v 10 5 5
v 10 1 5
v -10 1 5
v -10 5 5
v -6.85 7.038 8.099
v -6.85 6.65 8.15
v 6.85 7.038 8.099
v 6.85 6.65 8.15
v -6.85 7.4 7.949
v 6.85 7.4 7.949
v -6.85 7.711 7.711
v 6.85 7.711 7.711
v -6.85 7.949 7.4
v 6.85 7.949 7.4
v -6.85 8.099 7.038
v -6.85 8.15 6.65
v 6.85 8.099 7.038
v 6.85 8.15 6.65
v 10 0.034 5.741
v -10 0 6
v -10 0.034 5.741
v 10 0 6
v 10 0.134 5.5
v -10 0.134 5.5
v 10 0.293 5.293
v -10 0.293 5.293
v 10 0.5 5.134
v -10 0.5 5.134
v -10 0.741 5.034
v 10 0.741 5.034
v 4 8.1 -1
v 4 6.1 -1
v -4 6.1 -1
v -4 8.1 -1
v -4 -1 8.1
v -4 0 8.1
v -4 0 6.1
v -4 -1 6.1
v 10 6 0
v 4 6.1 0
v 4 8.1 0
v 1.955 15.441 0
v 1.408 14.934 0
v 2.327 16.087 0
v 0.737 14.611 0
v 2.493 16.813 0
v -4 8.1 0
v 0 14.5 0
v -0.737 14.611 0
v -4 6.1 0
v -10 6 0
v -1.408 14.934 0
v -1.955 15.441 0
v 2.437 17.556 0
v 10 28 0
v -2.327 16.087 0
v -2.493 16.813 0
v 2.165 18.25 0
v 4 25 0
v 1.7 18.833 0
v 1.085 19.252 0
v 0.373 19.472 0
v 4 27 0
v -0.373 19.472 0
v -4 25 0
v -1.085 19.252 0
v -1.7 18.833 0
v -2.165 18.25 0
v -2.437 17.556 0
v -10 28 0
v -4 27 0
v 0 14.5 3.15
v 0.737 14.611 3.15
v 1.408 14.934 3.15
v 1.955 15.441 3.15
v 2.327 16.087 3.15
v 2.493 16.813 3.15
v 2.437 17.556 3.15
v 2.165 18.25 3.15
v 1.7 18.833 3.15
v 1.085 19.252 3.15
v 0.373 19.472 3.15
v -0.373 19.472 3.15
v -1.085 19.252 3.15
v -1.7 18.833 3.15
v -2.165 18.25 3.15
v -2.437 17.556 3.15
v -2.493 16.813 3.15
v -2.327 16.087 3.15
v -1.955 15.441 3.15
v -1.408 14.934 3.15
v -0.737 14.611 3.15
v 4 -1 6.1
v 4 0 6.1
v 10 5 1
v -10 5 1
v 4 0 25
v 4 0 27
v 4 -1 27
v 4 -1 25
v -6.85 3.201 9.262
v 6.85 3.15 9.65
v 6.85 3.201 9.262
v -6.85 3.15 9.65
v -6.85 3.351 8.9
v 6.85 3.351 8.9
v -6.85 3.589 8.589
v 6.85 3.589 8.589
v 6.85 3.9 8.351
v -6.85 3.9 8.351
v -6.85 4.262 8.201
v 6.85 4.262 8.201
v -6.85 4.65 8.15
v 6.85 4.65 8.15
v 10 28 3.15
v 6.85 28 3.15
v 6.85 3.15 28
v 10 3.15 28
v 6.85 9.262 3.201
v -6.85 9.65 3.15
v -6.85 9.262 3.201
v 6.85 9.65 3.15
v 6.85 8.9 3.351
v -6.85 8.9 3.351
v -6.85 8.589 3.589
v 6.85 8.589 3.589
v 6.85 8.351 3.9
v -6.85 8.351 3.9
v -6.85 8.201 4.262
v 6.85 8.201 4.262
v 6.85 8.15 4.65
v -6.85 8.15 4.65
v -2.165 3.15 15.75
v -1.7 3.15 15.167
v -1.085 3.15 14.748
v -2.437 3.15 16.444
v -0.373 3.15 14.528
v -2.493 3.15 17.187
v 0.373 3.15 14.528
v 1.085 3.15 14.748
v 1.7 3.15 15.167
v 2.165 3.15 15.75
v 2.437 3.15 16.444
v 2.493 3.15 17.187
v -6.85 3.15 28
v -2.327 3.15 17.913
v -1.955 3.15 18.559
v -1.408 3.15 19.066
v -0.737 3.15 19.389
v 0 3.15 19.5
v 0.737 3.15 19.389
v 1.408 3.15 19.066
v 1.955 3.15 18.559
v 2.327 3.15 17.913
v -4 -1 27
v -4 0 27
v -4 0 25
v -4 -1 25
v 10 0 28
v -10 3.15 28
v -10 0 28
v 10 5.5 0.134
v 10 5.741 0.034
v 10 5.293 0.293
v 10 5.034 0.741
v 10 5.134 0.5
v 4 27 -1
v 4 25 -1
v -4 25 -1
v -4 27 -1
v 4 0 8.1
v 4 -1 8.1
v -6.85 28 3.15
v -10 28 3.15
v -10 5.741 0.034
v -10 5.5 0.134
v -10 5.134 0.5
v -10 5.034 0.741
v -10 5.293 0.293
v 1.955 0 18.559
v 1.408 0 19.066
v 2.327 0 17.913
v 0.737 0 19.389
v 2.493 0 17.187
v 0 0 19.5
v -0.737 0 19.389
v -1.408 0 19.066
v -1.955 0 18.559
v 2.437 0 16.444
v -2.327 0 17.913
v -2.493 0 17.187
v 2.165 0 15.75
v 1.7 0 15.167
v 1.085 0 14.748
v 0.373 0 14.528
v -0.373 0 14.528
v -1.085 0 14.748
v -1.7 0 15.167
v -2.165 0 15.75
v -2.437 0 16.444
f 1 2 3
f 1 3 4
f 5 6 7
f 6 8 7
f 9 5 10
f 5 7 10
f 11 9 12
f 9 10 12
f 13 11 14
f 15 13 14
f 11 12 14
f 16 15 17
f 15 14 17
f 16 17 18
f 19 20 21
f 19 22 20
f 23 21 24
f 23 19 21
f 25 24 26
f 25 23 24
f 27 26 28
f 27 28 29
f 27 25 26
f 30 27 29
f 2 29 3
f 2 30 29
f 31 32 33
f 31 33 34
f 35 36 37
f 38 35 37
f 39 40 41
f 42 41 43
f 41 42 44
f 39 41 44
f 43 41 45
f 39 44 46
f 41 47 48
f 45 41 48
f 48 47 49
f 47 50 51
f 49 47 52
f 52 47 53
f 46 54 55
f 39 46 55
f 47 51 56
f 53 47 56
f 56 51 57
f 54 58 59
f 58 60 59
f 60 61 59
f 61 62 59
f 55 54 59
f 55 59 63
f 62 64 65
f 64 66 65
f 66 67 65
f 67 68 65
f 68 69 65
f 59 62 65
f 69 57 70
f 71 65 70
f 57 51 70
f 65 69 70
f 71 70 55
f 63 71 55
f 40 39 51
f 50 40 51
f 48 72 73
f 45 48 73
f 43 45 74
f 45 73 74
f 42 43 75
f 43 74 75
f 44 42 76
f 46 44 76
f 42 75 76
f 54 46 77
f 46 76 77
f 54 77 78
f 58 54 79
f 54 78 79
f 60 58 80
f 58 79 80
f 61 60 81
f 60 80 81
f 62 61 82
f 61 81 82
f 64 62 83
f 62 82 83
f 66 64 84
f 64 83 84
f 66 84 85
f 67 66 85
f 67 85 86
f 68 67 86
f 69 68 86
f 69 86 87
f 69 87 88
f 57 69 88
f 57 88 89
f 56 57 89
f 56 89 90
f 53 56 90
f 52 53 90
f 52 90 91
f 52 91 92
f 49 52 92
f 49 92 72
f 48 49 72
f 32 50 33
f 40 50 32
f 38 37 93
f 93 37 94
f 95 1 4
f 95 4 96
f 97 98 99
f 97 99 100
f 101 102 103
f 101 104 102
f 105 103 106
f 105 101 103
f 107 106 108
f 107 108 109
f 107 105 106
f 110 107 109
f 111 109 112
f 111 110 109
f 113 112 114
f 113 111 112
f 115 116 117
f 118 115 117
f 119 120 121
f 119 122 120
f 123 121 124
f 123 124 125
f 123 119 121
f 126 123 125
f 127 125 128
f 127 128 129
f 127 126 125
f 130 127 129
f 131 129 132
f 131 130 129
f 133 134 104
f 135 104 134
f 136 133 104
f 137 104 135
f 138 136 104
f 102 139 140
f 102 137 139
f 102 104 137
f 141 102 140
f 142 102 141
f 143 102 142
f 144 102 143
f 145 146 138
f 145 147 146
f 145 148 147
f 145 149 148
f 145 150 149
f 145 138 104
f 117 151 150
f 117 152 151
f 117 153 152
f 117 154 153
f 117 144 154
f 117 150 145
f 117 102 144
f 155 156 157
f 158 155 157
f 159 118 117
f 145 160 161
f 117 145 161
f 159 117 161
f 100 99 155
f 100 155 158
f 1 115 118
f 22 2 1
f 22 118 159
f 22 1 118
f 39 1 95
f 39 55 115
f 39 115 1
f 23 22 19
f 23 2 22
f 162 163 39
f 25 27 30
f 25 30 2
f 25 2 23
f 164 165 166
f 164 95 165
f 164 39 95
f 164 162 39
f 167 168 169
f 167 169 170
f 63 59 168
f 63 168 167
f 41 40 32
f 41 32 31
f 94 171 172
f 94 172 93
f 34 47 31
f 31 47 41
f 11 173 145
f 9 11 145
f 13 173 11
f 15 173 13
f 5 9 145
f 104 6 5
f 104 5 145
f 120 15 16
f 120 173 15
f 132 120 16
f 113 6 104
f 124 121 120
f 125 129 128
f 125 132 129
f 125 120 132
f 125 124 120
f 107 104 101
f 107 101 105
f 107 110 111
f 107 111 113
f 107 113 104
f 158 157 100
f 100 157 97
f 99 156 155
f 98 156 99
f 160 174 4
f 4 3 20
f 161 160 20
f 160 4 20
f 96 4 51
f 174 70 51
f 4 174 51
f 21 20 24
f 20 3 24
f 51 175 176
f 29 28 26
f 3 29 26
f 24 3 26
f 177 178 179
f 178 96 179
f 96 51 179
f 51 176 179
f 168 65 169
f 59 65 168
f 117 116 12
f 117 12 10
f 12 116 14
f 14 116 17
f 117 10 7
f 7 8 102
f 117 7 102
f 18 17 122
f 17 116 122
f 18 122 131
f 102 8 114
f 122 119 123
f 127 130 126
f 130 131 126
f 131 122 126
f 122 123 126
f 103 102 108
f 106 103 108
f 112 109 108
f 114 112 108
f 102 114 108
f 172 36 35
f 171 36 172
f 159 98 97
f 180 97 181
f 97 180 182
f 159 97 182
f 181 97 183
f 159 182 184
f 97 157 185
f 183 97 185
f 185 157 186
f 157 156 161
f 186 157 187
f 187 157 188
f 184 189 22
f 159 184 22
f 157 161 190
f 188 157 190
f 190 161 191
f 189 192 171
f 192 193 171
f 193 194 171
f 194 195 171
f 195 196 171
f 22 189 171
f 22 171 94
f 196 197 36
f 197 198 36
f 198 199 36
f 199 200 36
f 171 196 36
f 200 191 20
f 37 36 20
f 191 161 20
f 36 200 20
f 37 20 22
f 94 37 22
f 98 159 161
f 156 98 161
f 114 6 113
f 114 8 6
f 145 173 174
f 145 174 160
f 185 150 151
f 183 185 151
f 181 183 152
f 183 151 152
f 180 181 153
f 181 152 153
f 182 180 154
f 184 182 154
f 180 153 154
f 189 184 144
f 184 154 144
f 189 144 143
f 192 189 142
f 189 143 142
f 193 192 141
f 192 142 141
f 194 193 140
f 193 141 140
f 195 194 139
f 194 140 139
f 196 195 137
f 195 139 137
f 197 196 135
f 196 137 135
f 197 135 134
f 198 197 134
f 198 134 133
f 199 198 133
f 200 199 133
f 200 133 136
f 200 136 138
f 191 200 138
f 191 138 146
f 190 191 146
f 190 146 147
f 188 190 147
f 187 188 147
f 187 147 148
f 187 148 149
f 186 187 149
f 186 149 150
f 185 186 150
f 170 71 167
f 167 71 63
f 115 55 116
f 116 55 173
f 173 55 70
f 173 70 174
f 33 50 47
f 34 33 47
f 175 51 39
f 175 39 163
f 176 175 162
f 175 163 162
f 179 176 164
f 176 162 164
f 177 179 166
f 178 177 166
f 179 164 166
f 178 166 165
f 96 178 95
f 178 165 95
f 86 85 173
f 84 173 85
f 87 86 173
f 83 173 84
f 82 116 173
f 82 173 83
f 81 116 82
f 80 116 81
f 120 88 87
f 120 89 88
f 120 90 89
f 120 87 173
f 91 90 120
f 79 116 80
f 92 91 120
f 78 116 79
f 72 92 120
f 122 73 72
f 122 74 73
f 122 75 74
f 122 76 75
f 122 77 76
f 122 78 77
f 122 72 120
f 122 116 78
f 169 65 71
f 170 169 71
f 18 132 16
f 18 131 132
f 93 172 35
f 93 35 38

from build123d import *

# Parameters (mm, degrees)
PAD_DEPTH       = 6.85
PAD001_DEPTH    = 3.15
FILLET_R        = 1
FILLET001_R     = 1.5
SKETCH002_W     = 2
SKETCH002_H     = 8
PAD002_DEPTH    = 1
SKETCH003_W     = 2
SKETCH003_H     = 8
PAD003_DEPTH    = 1
SKETCH004_R     = 2.5
POCKET_DEPTH    = 4.151
SKETCH005_R     = 2.5
POCKET001_DEPTH = 4.151


with BuildPart() as part:
    # Sketch → Pad (new body, symmetric)
    with BuildSketch(Plane.YZ):
        Polygon((0, 28), (0, 5), (5, 5), (5, 0), (28, 0), (28, 3.15), (8.15, 3.15), (8.15, 8.15), (3.15, 8.15), (3.15, 28), align=None)
    extrude(amount=PAD_DEPTH, both=True)

    # Sketch001 (on Face11 of Pad) → Pad001 (join)
    with BuildSketch(Plane(origin=(-6.85, 0, 0), x_dir=(0, 1, 0), z_dir=(-1, 0, 0))):
        Polygon((0, -28), (0, -5), (5, -5), (5, 0), (28, 0), (28, -3.15), (3.15, -28), align=None)
    pad001 = extrude(amount=PAD001_DEPTH)

    # Mirrored: Pad001 across YZ
    add(pad001.mirror(Plane.YZ))

    # Fillet
    fillet_edges = [part.edges().sort_by_distance(p)[0] for p in [
        (0, 5, 0),
        (0, 0, 5),
    ]]
    fillet(fillet_edges, radius=FILLET_R)

    # Fillet001
    fillet001_edges = [part.edges().sort_by_distance(p)[0] for p in [
        (0, 3.15, 8.15),
        (0, 8.15, 8.15),
        (0, 8.15, 3.15),
    ]]
    fillet(fillet001_edges, radius=FILLET001_R)

    # Sketch002 (on Face26 of Fillet001) → Pad002 (join)
    with BuildSketch(Plane(origin=(0, 0, 0), x_dir=(0, 0, -1), z_dir=(0, -1, 0))):
        with Locations((-26, 0)):
            Rectangle(SKETCH002_W, SKETCH002_H)
        with Locations((-7.1, 0)):
            Rectangle(SKETCH002_W, SKETCH002_H)
    extrude(amount=PAD002_DEPTH)

    # Sketch003 (on Face16 of Pad002) → Pad003 (join)
    with BuildSketch(Plane.YX):
        with Locations((7.1, 0)):
            Rectangle(SKETCH003_W, SKETCH003_H)
        with Locations((26, 0)):
            Rectangle(SKETCH003_W, SKETCH003_H)
    extrude(amount=PAD003_DEPTH)

    # Sketch004 (on Face6 of Pad003) → Pocket (cut, through all)
    with BuildSketch(Plane.ZX.offset(3.15)):
        with Locations((17, 0)):
            Circle(SKETCH004_R)
    extrude(amount=-POCKET_DEPTH, mode=Mode.SUBTRACT)

    # Sketch005 (on Face2 of Pocket) → Pocket001 (cut, through all)
    with BuildSketch(Plane(origin=(0, 0, 3.15), x_dir=(0, -1, 0), z_dir=(0, 0, 1))):
        with Locations((-17, 0)):
            Circle(SKETCH005_R)
    extrude(amount=-POCKET001_DEPTH, mode=Mode.SUBTRACT)


solid = part.part
